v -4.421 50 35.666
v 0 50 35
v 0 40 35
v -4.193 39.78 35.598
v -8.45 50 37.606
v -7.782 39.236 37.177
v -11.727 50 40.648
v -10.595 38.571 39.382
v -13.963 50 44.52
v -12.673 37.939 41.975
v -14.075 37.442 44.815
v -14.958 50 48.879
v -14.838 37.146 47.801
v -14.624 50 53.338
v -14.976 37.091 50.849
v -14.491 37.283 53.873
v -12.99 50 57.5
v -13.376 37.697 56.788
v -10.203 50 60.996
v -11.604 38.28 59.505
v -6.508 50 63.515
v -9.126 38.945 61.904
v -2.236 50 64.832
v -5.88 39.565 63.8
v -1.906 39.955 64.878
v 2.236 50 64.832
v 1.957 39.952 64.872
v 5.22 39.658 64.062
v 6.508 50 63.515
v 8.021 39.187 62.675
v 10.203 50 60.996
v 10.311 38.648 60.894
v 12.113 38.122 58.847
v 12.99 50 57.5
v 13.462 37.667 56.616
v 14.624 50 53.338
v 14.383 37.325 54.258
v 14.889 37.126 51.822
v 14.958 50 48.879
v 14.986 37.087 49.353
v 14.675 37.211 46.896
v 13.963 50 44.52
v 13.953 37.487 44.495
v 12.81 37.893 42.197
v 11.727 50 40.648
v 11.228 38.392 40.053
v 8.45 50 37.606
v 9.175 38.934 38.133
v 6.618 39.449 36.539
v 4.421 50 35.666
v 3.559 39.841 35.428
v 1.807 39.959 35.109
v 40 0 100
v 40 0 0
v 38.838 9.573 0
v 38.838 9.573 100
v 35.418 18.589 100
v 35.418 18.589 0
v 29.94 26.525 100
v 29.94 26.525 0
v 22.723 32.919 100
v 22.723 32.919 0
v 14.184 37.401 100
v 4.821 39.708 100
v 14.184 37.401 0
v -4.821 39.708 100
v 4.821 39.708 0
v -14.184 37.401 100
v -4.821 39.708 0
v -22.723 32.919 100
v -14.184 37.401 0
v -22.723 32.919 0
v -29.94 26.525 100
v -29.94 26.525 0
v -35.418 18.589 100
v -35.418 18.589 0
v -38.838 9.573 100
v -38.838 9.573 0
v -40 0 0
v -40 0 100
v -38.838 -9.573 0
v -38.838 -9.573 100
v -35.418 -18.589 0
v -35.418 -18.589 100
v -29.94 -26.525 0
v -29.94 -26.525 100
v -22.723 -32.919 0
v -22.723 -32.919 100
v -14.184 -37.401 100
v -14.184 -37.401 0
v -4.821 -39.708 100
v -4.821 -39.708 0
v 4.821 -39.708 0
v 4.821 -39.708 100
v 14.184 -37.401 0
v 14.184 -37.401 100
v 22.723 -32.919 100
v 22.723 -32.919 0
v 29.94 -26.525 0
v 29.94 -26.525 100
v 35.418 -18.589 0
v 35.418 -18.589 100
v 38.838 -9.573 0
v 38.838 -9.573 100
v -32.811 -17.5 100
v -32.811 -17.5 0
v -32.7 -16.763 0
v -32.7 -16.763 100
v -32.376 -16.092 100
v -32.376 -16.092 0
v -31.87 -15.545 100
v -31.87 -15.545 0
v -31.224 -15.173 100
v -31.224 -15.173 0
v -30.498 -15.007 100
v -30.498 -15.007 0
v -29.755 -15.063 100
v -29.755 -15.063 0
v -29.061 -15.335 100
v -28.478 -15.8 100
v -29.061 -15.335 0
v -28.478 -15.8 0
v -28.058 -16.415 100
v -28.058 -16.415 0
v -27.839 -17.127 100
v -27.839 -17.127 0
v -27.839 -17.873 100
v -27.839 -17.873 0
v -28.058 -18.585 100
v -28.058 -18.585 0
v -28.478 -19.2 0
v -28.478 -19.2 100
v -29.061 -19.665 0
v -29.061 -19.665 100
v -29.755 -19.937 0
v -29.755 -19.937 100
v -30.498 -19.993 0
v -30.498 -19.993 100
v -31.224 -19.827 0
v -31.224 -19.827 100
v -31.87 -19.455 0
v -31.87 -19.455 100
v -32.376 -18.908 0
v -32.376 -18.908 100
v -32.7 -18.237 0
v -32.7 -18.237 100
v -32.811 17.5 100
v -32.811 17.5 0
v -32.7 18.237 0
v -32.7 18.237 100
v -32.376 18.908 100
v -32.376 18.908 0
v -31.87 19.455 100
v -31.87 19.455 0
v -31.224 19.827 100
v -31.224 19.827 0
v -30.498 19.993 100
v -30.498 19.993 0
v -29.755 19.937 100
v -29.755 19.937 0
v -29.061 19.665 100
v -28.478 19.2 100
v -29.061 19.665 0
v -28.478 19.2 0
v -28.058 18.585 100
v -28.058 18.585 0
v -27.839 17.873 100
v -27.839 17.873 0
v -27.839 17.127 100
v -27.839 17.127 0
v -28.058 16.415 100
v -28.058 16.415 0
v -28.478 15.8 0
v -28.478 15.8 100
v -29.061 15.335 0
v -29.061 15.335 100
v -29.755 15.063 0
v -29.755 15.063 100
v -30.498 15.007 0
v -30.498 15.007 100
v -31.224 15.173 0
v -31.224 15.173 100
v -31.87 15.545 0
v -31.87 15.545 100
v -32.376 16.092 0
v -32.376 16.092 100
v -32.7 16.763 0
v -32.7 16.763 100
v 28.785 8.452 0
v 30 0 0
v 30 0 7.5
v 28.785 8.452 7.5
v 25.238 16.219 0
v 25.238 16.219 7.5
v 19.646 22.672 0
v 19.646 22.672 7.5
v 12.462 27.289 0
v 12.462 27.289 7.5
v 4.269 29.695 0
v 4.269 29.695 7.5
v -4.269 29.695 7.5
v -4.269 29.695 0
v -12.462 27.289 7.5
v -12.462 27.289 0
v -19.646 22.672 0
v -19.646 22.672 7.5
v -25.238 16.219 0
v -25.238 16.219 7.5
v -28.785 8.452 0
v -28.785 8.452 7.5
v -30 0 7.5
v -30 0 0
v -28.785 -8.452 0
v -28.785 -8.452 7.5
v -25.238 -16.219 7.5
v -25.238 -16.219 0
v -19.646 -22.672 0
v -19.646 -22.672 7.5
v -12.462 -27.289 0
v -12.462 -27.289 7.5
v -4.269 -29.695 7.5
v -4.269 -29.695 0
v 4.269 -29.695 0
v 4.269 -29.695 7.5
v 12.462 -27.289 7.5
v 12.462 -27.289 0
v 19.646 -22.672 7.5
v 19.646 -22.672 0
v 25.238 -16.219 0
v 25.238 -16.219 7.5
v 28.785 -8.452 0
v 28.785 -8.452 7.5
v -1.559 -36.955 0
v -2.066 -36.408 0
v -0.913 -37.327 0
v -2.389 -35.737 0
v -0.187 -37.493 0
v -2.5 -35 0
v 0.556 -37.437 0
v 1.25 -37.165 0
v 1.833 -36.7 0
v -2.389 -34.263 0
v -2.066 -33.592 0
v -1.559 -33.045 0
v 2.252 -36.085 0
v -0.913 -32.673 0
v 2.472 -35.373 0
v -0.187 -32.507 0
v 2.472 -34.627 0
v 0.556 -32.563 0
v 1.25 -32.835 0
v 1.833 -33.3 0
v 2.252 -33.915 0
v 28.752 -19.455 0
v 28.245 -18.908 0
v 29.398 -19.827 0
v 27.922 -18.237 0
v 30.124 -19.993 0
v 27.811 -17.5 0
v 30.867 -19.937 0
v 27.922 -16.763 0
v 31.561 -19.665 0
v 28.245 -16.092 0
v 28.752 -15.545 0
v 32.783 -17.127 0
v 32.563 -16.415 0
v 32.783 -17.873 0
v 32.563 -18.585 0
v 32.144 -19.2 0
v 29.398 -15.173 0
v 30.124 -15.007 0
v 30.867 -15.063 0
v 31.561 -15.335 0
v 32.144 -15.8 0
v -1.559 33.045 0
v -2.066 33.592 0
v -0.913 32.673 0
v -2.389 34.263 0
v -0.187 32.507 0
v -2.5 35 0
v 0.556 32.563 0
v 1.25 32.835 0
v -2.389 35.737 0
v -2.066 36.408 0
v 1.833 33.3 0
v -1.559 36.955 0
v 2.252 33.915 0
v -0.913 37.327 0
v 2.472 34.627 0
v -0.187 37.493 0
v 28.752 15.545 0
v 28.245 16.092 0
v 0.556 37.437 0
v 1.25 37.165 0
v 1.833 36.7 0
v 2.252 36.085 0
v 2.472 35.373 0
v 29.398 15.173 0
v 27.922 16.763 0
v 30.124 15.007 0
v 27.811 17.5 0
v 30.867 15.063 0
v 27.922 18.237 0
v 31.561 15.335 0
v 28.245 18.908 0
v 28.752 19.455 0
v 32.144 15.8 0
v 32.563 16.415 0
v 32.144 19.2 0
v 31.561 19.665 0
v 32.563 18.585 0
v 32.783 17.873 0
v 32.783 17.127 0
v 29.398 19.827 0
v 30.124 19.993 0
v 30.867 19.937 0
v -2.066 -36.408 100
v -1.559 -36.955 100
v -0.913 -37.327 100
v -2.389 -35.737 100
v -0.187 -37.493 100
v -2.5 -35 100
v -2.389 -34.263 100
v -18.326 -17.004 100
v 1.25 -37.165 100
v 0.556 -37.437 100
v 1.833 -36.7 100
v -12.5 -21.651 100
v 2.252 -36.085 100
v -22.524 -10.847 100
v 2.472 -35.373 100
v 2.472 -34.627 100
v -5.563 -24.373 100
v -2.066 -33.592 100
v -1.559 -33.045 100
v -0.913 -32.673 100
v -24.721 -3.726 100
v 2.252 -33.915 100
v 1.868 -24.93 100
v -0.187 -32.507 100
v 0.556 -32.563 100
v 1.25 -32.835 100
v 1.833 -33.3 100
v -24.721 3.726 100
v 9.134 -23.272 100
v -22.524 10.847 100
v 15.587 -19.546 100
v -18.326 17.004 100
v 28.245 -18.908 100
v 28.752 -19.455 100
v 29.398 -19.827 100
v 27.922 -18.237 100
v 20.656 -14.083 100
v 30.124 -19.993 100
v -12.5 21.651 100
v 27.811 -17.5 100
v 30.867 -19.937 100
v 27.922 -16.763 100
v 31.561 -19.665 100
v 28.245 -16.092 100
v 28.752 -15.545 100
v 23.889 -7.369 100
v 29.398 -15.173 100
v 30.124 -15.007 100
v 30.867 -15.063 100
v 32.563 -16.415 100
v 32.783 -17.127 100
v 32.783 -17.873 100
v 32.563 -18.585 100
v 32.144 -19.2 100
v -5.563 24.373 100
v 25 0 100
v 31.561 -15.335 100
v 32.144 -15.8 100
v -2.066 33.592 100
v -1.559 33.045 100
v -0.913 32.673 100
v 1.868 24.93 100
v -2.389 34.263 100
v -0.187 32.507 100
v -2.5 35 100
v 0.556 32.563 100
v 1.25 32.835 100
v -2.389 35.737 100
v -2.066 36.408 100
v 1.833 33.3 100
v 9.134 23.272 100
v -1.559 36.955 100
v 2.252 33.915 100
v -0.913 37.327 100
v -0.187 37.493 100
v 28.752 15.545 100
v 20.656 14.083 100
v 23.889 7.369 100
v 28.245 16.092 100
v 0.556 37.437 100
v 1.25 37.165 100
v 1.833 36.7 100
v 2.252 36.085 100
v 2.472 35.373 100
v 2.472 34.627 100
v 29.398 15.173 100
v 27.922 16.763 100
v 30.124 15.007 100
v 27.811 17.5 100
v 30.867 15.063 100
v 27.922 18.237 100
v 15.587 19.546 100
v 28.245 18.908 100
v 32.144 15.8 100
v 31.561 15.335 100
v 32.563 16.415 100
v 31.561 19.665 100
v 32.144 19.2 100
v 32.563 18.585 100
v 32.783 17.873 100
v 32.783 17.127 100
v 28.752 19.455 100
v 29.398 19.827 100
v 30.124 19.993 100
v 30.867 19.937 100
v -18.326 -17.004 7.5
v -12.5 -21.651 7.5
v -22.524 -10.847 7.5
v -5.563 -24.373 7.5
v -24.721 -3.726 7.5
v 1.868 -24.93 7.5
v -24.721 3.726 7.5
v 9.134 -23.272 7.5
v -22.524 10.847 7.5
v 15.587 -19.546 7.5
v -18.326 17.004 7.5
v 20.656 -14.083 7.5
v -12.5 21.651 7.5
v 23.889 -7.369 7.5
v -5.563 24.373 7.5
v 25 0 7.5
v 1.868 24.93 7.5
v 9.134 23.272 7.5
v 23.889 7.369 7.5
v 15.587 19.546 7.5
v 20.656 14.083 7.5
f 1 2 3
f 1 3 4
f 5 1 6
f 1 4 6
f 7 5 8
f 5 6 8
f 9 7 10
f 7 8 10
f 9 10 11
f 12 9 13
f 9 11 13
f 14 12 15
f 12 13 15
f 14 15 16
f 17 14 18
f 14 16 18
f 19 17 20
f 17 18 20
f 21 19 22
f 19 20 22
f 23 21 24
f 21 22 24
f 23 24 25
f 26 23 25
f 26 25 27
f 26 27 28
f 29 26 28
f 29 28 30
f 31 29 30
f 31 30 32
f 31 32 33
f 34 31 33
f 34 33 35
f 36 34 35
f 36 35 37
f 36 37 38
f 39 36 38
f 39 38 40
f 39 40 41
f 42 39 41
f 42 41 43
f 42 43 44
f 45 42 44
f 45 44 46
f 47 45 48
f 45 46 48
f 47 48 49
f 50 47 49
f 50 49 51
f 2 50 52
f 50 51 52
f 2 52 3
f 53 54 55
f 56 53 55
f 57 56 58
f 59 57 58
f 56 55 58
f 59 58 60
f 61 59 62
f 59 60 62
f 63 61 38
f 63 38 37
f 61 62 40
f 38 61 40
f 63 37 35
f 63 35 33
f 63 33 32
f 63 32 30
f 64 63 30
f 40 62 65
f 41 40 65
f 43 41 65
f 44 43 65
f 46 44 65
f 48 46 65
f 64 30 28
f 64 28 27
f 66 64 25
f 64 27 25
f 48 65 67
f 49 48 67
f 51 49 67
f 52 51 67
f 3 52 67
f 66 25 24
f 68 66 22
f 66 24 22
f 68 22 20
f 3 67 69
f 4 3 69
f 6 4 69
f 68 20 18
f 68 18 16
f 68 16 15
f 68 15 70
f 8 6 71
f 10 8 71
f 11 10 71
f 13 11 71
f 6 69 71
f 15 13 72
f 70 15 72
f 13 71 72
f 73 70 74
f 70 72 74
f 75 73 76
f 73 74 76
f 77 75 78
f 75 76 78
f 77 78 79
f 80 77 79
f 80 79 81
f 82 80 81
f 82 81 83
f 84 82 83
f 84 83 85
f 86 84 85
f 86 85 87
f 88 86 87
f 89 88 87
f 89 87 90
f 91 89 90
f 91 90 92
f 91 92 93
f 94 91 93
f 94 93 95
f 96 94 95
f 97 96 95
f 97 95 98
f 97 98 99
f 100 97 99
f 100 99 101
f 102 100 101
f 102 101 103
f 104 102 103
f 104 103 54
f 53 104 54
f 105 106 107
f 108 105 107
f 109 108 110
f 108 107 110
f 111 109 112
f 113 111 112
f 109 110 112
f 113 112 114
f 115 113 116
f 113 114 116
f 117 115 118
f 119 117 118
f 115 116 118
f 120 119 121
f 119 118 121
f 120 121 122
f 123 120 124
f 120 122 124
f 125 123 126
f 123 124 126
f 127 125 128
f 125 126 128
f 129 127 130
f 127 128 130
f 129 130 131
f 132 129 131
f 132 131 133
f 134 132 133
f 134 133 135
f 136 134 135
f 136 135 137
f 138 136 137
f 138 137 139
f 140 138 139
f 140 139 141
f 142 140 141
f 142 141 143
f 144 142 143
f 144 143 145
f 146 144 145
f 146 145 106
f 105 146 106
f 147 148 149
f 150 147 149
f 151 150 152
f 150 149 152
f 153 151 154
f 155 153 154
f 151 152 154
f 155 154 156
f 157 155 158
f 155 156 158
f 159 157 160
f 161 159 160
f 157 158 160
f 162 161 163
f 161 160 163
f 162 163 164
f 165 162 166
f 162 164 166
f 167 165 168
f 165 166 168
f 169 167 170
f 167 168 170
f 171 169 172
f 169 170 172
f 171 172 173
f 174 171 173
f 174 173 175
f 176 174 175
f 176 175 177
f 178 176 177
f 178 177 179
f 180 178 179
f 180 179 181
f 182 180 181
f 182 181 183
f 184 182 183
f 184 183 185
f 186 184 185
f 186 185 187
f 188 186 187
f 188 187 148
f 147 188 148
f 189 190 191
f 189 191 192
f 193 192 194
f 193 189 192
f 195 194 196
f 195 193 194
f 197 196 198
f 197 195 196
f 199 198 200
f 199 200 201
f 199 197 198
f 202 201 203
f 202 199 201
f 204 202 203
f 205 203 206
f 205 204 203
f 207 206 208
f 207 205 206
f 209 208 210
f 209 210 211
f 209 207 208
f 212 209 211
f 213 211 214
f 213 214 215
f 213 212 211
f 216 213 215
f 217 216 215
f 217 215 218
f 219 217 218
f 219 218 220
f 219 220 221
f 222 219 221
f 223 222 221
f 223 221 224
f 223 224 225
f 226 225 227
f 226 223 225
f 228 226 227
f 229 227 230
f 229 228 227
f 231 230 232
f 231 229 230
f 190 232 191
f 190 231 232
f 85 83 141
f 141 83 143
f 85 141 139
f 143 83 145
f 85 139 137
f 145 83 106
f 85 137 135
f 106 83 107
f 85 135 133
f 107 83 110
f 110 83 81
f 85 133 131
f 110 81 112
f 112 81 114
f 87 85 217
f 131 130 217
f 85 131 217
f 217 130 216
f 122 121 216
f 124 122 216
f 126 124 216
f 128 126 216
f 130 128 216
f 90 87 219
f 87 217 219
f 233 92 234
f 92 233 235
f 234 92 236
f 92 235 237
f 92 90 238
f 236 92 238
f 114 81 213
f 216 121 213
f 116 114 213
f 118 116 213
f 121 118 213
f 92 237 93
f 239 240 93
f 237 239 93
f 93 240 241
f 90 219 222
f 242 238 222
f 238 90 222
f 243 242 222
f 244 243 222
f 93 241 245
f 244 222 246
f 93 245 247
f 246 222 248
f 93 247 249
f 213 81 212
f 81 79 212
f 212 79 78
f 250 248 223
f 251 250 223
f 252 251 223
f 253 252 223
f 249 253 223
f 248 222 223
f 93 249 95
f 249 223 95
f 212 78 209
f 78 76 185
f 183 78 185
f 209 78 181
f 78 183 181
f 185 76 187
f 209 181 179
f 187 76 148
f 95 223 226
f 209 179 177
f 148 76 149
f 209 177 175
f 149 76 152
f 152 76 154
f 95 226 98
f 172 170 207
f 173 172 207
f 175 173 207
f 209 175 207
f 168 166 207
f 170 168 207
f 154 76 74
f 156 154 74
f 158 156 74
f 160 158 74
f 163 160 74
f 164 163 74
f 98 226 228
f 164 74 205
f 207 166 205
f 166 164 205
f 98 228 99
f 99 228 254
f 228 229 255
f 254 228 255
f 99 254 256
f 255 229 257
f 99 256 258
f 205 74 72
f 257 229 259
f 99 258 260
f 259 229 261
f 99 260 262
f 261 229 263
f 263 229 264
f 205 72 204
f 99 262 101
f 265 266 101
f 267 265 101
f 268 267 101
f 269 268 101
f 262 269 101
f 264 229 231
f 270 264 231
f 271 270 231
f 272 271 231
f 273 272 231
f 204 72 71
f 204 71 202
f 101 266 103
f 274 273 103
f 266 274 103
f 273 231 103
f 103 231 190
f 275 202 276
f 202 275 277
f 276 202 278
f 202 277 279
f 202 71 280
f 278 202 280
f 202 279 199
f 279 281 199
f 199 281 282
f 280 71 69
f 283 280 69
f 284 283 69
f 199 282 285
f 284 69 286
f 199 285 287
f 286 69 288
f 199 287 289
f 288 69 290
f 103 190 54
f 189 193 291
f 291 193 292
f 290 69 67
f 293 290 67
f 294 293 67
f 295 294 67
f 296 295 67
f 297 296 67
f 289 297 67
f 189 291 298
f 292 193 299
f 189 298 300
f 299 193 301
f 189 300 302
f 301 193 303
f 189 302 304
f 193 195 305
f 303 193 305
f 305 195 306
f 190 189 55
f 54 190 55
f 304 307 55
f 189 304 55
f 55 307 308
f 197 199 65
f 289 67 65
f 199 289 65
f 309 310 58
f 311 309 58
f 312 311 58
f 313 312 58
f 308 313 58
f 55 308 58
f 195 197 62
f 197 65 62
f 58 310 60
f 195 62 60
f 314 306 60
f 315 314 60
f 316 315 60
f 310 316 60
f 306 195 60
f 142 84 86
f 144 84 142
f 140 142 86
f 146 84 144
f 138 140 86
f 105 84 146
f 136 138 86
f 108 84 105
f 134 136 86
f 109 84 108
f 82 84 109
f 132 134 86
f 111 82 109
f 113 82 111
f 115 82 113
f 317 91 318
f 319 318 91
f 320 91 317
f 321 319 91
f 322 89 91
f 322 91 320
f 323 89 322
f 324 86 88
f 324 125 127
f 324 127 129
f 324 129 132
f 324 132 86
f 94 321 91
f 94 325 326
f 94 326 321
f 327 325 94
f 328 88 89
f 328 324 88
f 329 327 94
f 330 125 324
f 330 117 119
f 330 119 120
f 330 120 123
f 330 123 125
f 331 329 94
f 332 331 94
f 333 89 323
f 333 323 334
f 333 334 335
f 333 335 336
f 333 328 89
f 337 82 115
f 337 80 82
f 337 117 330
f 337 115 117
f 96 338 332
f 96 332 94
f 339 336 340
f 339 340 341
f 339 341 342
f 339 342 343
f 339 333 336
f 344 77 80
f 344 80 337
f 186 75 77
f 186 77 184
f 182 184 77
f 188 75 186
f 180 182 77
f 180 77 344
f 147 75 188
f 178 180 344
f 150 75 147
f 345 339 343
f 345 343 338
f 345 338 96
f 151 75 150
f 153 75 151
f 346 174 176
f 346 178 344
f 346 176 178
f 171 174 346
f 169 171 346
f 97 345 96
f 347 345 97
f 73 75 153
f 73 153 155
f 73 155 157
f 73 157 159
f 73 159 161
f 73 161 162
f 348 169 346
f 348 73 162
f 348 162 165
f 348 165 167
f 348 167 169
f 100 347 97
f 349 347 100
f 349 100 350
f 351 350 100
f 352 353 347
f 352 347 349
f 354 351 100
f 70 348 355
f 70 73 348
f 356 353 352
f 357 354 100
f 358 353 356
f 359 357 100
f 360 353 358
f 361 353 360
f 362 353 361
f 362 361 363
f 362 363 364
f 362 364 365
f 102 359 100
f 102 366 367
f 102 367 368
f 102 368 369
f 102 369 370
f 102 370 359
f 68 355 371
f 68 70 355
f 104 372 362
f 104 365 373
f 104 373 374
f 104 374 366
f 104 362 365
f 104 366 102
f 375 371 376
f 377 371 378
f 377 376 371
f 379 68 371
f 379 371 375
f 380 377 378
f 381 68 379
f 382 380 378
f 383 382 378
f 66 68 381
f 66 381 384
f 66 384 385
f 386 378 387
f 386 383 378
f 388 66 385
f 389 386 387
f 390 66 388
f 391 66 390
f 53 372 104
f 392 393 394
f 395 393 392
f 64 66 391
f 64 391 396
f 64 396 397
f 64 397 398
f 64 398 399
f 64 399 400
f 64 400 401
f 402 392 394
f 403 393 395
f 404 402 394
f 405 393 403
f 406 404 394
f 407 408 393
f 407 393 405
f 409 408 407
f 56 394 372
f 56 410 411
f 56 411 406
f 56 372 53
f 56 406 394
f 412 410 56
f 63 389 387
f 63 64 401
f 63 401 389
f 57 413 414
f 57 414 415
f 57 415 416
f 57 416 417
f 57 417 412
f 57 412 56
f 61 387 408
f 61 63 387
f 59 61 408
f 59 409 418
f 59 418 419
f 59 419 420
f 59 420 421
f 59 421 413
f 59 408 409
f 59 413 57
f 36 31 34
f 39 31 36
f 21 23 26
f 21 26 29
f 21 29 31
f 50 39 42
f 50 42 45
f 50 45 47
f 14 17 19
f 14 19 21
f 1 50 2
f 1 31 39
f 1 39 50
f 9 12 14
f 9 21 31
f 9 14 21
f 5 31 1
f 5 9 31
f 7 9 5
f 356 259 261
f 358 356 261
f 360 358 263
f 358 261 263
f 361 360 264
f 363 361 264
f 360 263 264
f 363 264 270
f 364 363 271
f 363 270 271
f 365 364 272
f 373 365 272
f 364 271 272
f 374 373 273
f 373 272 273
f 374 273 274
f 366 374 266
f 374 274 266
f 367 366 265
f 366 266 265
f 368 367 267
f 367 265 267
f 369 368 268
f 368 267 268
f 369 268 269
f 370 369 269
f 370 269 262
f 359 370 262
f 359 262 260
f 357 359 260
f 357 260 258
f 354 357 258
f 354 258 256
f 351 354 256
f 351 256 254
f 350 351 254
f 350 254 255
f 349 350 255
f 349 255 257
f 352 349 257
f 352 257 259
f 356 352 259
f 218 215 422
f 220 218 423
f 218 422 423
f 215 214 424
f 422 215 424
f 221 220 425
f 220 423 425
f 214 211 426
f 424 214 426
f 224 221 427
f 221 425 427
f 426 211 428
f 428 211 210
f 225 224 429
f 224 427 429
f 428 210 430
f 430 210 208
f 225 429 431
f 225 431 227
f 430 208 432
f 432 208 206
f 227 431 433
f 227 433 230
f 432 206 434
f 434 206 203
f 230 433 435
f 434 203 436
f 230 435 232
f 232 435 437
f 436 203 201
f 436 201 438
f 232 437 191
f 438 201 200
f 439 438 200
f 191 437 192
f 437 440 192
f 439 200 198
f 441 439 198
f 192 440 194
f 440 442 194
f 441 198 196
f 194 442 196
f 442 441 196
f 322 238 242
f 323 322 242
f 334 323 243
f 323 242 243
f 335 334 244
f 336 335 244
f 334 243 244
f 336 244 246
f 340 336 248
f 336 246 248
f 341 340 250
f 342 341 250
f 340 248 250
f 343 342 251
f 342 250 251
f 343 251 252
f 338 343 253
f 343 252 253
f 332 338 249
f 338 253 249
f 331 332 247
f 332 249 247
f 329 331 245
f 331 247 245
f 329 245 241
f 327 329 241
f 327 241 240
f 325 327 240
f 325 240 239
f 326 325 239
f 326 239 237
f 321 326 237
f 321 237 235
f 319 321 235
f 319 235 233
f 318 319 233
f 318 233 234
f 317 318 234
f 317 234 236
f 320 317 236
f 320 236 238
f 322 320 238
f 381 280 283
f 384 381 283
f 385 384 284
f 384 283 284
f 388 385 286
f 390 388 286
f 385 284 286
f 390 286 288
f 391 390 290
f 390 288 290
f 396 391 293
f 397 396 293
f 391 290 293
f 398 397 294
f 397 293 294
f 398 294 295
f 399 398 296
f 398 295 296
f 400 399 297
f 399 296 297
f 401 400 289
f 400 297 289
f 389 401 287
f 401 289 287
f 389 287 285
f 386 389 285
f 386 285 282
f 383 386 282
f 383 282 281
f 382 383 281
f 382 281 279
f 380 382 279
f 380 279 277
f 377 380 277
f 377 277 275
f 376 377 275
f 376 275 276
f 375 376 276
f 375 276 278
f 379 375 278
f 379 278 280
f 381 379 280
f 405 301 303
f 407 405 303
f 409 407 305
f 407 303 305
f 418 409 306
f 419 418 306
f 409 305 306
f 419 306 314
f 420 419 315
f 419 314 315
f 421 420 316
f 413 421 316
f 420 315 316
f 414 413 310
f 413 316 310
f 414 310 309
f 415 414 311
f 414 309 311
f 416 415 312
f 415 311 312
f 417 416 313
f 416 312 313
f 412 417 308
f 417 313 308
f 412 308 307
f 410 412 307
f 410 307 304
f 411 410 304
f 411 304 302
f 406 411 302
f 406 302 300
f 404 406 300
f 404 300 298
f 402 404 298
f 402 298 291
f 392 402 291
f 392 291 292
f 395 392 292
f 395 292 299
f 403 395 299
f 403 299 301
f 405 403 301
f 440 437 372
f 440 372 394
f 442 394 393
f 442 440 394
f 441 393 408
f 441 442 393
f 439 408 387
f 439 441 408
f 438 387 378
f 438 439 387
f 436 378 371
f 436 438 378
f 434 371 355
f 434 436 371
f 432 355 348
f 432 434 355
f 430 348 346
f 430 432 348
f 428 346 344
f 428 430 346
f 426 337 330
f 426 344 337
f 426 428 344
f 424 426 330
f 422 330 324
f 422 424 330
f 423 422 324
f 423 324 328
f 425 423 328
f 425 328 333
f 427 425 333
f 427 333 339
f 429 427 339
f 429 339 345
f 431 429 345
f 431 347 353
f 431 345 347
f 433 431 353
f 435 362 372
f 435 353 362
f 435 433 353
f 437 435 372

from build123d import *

# Parameters (mm, degrees)
SKETCH1_R              = 40
BODY_DEPTH             = 100
SKETCH3_R              = 25
MOTOR_CASING_DEPTH     = 246
SKETCH4_R              = 30
SLEW_BEARING_LIP_DEPTH = 7.5
BASE_START             = 30
SKETCH6_R              = 15
BASE_DEPTH             = 20
SKETCH5_R              = 2.5
SCREW_HOLES_DEPTH      = 119.74342103


with BuildPart() as part:
    # Sketch1 → body (new body)
    with BuildSketch(Plane.XY):
        Circle(SKETCH1_R)
    extrude(amount=BODY_DEPTH)

    # Sketch3 → motor casing (cut)
    with BuildSketch(Plane.XY):
        Circle(SKETCH3_R)
    extrude(amount=MOTOR_CASING_DEPTH, mode=Mode.SUBTRACT)

    # Sketch4 → slew bearing lip (cut)
    with BuildSketch(Plane.XY):
        Circle(SKETCH4_R)
    extrude(amount=SLEW_BEARING_LIP_DEPTH, mode=Mode.SUBTRACT)

    # Sketch6 → base (add)
    with BuildSketch(Plane(origin=(0, 0, 0), x_dir=(1, 0, 0), z_dir=(0, 1, 0)).offset(BASE_START)):
        with Locations(Location((0, -50, 0), (0, 0, 90))):
            Circle(SKETCH6_R)
    extrude(amount=BASE_DEPTH)

    # Sketch5 → screw holes (cut, through all)
    with BuildSketch(Plane(origin=(0, 0, 0), x_dir=(-1, 0, 0), z_dir=(0, 0, -1))):
        with Locations((0, 35)):
            Circle(SKETCH5_R)
        with Locations((30.310889132, 17.5)):
            Circle(SKETCH5_R)
        with Locations((30.310889132, -17.5)):
            Circle(SKETCH5_R)
        with Locations((0, -35)):
            Circle(SKETCH5_R)
        with Locations((-30.310889132, -17.5)):
            Circle(SKETCH5_R)
        with Locations((-30.310889132, 17.5)):
            Circle(SKETCH5_R)
    extrude(amount=-SCREW_HOLES_DEPTH, mode=Mode.SUBTRACT)


solid = part.part
